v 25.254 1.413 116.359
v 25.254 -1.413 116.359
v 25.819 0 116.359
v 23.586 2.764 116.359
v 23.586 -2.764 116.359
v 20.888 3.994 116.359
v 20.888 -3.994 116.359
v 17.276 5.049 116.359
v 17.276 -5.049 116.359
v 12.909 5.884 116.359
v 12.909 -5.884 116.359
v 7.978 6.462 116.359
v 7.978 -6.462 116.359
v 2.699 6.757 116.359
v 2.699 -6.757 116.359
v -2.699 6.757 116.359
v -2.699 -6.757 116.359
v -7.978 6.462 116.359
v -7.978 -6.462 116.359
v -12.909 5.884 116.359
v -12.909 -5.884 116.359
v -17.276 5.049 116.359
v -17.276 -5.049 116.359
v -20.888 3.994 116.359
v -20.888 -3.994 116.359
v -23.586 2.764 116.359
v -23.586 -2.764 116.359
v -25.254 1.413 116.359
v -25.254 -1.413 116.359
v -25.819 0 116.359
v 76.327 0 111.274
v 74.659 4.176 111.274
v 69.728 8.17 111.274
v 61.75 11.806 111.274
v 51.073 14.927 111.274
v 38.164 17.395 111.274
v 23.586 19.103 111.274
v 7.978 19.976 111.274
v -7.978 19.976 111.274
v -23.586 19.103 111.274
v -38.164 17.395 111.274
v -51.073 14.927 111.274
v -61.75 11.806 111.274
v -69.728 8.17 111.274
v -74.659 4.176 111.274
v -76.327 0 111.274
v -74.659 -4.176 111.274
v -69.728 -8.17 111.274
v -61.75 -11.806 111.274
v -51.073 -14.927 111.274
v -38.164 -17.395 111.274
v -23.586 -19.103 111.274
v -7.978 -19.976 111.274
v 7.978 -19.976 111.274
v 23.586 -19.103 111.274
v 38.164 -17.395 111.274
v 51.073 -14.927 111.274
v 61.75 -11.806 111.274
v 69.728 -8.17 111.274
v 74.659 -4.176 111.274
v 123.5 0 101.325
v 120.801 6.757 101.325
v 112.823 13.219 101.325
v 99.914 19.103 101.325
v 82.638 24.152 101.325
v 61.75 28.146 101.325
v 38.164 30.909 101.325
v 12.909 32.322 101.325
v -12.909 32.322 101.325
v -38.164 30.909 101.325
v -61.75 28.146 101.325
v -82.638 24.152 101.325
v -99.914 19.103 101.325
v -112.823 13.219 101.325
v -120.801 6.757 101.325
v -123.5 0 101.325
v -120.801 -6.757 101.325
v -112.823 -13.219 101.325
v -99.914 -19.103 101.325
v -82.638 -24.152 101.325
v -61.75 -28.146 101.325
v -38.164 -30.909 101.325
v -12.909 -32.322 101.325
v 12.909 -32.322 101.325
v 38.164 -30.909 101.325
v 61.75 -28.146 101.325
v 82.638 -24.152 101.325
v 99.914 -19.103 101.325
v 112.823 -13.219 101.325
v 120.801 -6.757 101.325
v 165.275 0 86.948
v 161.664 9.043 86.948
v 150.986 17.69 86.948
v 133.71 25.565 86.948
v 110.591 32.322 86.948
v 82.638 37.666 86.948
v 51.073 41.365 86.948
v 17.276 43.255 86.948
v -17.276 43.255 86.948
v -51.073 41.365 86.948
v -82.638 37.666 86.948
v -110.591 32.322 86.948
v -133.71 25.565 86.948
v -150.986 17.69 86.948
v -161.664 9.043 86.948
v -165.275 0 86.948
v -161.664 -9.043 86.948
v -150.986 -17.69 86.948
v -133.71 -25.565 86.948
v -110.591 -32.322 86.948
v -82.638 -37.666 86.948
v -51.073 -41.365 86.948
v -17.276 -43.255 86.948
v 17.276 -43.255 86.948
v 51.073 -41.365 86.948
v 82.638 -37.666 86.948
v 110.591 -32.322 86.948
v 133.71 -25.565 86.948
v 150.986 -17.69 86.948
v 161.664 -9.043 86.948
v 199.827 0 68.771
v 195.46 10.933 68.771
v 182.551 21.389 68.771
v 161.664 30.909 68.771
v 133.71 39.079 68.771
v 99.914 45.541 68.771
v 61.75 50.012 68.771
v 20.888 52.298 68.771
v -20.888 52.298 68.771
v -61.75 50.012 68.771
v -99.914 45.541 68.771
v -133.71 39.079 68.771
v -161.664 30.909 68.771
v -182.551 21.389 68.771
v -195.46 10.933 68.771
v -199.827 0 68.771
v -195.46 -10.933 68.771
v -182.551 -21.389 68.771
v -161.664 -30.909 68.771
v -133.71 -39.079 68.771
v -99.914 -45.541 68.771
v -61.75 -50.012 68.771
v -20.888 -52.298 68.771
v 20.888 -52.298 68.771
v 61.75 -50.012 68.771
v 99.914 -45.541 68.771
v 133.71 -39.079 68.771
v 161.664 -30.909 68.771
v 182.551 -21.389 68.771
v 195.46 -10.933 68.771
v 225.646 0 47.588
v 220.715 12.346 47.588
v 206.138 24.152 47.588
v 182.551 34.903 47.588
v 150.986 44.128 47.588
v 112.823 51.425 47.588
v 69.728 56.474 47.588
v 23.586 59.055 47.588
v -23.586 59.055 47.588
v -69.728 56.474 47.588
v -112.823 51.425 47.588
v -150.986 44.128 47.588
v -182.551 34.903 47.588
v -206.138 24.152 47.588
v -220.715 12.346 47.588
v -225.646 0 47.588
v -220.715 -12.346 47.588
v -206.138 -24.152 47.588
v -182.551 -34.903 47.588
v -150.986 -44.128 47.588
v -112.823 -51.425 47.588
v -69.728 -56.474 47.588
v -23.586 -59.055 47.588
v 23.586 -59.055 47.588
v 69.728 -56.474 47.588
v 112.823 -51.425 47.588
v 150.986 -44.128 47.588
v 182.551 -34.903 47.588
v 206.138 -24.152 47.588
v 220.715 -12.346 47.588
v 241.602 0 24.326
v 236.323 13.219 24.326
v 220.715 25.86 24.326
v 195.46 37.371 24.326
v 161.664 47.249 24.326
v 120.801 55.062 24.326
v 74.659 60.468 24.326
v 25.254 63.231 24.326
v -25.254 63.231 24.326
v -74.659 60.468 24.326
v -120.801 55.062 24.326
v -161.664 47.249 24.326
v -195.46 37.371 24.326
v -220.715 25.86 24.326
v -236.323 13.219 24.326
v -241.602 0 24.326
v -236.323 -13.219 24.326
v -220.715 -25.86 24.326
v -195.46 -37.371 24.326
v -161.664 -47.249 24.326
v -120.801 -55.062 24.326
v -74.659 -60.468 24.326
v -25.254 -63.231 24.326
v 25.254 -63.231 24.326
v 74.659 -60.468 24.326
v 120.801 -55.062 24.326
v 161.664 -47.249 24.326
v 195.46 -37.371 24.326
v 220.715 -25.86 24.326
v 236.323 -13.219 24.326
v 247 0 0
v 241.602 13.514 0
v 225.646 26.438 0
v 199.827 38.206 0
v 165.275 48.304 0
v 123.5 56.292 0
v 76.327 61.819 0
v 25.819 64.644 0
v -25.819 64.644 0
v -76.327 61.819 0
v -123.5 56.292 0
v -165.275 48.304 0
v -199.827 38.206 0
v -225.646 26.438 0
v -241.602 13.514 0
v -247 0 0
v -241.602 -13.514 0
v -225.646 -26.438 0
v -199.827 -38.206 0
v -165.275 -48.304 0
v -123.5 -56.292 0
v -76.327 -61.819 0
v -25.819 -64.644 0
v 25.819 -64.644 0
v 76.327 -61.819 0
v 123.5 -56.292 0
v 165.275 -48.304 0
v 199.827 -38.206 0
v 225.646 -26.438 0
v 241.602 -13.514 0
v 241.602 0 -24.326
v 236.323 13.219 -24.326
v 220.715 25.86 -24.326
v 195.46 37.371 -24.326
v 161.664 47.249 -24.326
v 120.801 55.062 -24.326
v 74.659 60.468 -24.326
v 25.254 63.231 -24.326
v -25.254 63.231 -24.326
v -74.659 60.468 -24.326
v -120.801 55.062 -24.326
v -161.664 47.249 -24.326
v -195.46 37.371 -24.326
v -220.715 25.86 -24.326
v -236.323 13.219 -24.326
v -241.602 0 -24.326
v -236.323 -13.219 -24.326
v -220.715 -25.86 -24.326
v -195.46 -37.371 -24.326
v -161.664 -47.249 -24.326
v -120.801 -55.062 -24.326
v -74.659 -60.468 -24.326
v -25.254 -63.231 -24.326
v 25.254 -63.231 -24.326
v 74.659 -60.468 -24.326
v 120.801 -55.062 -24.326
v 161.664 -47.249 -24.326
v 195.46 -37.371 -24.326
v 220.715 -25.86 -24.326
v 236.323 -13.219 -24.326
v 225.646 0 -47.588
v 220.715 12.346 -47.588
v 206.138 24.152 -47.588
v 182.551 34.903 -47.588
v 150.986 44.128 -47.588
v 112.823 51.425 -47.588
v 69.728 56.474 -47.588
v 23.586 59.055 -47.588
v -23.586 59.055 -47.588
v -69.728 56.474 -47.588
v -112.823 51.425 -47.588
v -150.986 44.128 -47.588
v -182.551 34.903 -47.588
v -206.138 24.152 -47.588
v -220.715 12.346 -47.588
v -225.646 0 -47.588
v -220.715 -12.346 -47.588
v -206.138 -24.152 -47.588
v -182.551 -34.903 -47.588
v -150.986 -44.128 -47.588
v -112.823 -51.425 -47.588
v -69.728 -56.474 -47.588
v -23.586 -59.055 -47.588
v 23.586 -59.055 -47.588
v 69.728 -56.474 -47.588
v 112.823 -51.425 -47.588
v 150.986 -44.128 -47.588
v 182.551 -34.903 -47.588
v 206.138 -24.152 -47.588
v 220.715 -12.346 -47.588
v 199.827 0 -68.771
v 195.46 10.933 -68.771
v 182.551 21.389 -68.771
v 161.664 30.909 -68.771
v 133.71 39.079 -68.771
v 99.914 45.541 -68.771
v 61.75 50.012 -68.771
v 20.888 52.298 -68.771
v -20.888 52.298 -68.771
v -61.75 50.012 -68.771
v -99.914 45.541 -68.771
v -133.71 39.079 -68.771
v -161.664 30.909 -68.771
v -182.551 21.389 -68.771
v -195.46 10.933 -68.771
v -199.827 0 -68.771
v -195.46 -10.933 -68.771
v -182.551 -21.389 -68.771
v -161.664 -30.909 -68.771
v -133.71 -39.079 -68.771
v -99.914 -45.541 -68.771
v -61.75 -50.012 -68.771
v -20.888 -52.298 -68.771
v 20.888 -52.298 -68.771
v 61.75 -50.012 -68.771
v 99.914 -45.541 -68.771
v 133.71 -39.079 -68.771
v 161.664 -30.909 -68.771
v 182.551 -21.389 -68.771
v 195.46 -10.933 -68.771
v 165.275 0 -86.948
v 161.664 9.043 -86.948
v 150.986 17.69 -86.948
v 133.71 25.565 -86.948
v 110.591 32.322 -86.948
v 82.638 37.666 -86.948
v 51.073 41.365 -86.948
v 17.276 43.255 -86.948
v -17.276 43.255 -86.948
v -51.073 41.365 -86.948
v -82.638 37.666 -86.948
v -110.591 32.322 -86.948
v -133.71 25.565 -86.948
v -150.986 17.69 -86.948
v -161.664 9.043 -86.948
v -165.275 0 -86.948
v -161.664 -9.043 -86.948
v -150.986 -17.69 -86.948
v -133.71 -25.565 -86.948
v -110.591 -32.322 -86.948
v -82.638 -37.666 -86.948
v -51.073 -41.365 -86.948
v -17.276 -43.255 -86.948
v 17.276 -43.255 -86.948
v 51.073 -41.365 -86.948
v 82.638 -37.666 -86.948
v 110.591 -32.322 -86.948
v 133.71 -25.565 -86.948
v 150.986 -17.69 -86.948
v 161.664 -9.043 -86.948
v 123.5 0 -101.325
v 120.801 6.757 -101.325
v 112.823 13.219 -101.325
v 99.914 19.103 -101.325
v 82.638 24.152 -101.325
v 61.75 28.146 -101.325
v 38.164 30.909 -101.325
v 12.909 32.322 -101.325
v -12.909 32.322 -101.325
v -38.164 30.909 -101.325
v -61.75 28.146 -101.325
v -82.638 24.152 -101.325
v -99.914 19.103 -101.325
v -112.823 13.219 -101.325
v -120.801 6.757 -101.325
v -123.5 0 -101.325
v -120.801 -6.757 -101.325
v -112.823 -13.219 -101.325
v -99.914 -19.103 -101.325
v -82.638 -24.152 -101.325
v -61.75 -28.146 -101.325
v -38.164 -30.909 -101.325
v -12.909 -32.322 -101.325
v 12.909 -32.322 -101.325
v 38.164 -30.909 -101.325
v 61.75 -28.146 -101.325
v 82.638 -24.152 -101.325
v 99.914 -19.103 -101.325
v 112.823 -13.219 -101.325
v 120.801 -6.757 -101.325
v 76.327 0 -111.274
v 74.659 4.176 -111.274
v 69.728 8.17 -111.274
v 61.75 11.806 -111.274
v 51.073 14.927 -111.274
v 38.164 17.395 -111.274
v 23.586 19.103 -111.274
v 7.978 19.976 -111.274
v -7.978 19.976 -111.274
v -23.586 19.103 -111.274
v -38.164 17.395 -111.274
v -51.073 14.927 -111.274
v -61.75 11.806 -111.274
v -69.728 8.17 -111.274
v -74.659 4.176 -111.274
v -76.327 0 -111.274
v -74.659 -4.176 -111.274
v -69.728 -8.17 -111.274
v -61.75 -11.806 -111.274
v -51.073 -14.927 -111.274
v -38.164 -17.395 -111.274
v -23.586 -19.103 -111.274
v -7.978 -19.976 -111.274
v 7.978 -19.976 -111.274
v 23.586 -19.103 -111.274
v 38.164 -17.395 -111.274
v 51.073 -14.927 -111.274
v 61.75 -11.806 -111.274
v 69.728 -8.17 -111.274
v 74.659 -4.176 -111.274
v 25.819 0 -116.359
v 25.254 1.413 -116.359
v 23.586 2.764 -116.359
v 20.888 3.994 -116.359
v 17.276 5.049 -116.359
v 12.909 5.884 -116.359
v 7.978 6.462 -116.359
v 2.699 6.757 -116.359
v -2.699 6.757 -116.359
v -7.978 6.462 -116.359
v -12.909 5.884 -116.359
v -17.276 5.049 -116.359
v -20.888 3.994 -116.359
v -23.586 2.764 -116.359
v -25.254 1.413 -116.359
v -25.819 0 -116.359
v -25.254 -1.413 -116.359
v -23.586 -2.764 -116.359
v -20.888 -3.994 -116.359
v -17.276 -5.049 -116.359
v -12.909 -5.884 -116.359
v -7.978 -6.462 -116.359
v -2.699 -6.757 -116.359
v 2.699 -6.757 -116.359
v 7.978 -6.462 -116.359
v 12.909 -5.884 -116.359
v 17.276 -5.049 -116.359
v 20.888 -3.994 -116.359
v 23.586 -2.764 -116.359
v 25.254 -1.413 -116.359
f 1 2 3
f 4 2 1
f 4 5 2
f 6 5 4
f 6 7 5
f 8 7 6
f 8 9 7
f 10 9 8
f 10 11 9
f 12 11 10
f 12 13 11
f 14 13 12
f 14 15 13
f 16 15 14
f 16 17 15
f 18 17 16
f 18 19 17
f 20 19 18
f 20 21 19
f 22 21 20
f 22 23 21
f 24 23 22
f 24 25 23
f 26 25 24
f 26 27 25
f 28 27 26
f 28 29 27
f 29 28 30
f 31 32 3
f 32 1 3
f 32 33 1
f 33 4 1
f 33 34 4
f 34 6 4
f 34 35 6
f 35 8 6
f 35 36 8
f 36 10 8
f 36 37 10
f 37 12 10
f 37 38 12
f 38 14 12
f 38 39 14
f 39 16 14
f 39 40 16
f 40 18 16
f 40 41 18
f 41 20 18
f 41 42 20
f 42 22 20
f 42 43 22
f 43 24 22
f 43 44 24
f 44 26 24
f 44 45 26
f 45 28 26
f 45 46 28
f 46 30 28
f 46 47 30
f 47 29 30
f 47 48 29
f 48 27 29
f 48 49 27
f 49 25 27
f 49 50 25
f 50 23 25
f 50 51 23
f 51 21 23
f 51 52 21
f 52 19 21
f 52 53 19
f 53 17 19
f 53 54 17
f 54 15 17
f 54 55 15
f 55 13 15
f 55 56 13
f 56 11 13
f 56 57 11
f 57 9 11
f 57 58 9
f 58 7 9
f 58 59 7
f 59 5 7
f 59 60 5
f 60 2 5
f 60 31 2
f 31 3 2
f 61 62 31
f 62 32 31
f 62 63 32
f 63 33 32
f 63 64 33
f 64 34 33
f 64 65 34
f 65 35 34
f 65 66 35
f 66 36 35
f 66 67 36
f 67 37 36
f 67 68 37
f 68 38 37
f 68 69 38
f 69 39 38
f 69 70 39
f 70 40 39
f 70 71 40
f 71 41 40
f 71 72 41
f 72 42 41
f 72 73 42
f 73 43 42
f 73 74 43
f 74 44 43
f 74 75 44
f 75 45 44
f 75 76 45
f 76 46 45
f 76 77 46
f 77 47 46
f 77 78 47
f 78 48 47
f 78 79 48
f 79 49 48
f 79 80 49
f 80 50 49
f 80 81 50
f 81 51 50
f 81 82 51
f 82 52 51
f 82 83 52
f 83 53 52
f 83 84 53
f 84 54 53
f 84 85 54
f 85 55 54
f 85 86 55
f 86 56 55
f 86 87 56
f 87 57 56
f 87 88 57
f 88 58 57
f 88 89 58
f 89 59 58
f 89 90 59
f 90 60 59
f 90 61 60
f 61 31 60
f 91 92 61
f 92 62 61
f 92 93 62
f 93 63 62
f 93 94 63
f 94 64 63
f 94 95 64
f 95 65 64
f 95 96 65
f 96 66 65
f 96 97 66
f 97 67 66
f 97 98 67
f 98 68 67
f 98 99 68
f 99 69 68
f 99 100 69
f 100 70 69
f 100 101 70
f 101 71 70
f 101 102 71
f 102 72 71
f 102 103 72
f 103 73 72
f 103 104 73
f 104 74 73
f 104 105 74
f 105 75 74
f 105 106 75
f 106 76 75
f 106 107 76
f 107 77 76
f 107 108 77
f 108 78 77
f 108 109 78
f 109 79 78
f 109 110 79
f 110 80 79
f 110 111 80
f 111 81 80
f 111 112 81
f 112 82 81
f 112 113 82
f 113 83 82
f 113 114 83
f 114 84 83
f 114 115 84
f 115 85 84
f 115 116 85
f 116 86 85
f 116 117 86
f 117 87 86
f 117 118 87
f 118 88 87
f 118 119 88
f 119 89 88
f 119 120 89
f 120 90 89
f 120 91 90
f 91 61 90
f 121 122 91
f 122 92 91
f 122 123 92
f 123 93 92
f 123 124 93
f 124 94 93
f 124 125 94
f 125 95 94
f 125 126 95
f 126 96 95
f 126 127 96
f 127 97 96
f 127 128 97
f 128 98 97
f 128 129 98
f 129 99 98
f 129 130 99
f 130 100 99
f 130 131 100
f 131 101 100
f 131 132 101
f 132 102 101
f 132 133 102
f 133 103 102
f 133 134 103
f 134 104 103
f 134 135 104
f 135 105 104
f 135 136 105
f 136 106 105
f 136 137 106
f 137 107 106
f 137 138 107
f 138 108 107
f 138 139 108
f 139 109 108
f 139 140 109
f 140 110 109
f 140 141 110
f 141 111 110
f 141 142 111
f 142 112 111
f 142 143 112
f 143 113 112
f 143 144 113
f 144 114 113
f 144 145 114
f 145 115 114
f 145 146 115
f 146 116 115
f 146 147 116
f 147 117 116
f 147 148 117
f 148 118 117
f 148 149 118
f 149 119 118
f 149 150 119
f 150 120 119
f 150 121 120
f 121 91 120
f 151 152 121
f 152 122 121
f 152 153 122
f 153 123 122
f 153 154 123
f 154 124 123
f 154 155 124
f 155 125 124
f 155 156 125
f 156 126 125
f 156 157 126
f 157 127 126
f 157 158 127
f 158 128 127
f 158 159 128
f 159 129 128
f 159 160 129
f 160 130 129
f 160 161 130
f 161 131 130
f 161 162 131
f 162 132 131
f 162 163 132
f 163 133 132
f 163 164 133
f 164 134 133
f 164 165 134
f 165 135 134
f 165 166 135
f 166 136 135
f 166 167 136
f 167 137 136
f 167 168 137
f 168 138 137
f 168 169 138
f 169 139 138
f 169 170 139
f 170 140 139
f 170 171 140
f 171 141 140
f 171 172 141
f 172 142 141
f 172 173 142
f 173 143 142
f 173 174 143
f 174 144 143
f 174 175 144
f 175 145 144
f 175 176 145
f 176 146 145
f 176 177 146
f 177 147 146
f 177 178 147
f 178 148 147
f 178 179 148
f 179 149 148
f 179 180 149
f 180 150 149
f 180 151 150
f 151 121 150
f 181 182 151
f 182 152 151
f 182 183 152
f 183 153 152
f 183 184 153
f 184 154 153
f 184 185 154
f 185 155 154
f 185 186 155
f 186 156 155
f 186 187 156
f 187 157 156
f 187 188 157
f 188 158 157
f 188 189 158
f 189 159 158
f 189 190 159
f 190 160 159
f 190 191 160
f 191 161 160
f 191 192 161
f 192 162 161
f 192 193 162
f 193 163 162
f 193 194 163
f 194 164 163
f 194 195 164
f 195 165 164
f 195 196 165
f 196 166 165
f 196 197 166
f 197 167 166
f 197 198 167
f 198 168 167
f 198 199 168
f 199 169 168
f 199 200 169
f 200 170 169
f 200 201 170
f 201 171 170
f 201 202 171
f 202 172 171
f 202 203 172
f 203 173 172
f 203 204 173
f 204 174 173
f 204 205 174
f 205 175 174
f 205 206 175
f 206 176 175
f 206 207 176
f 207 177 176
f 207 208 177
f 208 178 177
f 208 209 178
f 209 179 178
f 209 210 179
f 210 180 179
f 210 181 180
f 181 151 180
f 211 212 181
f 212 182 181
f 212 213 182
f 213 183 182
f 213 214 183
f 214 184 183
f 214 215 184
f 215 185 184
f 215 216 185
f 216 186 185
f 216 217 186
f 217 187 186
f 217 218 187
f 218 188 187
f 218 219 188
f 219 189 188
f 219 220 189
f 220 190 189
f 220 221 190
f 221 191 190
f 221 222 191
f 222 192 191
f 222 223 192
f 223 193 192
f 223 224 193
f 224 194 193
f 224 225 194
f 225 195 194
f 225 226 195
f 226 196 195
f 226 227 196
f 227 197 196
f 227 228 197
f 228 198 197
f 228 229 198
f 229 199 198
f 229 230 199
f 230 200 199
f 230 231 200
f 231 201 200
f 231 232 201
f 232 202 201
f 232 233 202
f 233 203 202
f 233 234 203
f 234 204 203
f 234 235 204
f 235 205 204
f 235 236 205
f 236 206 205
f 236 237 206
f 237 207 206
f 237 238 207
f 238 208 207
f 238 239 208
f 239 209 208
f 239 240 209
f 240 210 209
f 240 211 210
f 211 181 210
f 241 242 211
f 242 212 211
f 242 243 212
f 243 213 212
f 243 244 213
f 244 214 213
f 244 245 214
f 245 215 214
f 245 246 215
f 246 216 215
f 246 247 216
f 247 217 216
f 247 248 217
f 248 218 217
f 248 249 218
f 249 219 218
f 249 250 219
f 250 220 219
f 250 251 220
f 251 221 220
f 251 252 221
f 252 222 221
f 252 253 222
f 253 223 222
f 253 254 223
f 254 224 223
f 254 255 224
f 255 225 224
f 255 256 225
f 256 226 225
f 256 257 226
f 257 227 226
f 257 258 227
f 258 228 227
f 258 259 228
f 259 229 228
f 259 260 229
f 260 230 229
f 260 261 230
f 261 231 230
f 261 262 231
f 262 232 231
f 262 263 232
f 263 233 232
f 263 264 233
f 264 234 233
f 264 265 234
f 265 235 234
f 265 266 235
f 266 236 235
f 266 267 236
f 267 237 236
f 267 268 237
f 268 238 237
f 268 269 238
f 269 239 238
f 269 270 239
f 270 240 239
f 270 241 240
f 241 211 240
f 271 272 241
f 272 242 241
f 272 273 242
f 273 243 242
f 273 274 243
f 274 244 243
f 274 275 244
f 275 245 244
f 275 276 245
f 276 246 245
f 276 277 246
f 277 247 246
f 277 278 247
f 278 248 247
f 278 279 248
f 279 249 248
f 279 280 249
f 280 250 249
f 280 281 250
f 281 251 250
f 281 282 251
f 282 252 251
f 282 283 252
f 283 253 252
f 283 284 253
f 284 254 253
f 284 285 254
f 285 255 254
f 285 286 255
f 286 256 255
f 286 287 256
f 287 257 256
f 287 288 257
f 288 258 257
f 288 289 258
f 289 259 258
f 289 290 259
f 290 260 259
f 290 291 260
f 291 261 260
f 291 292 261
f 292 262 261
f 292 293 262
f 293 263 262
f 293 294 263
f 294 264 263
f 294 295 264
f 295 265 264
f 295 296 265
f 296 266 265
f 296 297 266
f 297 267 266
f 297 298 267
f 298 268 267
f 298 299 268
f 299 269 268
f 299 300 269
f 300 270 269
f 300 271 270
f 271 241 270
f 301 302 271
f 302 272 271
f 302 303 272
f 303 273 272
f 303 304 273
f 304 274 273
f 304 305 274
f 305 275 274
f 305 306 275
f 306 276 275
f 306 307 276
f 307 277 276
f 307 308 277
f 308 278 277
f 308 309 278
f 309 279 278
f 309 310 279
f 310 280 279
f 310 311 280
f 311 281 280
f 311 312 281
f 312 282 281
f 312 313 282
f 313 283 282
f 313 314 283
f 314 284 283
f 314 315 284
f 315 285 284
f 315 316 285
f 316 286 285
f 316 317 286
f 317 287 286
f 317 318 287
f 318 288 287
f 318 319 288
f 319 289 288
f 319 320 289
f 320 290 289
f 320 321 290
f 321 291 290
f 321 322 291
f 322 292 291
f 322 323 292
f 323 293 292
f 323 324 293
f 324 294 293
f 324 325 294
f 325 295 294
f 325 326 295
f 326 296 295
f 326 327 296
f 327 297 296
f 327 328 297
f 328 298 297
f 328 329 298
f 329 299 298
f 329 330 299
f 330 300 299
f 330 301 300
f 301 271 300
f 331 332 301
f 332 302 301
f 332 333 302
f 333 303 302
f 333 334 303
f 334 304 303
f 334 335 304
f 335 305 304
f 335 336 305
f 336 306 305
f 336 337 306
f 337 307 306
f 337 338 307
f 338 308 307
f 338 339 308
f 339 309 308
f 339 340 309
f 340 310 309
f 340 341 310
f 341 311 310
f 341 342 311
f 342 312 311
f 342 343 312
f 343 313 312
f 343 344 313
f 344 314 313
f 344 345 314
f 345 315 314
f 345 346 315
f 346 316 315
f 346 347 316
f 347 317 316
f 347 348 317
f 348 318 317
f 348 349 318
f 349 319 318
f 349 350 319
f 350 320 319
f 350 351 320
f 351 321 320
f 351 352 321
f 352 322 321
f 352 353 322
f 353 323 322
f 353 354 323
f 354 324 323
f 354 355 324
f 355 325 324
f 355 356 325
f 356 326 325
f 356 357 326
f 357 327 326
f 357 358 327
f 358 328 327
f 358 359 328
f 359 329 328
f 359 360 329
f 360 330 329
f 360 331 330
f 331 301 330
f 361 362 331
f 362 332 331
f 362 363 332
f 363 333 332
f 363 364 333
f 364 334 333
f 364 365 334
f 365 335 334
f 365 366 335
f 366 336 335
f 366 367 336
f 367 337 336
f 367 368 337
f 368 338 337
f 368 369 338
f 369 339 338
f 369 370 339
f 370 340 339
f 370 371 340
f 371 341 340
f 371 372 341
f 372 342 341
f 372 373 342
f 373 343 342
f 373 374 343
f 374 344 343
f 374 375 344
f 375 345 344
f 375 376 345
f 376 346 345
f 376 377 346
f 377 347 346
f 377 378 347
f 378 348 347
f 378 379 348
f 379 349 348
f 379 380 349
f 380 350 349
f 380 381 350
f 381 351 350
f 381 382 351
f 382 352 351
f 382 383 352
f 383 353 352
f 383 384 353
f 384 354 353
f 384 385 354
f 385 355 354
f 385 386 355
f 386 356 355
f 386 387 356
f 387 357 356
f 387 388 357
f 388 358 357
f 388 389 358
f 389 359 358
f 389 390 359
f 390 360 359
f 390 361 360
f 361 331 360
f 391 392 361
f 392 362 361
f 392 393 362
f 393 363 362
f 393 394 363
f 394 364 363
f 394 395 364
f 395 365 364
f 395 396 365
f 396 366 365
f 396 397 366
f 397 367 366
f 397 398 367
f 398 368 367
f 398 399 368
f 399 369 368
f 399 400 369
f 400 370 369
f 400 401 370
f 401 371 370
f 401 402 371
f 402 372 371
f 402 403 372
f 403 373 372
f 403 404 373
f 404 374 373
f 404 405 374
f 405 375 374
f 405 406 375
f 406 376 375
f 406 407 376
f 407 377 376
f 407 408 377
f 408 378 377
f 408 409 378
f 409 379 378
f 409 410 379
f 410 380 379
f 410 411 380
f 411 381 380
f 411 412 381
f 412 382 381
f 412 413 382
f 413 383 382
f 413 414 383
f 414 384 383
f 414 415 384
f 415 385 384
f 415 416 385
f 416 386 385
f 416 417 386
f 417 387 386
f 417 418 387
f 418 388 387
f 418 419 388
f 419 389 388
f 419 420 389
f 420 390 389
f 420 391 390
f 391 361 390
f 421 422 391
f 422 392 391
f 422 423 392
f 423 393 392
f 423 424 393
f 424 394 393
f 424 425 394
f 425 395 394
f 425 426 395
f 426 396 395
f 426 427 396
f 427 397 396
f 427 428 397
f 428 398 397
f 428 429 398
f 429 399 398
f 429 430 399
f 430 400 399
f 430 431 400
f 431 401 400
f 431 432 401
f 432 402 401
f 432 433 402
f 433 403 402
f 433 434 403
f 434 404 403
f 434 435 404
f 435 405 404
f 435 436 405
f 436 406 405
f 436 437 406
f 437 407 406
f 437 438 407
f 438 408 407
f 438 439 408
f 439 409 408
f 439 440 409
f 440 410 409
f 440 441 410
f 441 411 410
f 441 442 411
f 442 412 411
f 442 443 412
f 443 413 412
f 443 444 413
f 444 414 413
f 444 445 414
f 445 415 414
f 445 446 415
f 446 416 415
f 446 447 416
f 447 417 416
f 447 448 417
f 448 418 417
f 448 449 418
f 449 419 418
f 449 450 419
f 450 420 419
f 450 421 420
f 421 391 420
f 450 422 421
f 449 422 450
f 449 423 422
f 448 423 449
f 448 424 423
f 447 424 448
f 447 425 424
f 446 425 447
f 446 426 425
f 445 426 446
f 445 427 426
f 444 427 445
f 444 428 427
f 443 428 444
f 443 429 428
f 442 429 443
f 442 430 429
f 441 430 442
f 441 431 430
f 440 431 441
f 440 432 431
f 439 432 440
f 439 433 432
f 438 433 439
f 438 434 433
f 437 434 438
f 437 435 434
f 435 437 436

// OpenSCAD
// Generated by SolidPython 1.0.1 on 2020-07-29 00:46:53


scale(v = [19, 5, 9]) {
	sphere(r = 13);
}
/***********************************************
*********      SolidPython code:      **********
************************************************
 
# import packages: SolidPython
from solid import *
from solid.utils import *
from itertools import chain, combinations, permutations


class Resize:

    def __init__(self, scad_file):
        self.scad_file = scad_file
        #self.scad_file = import_scad(scad_file)
        # cone/cylinder param:
        self.r1 = 0
        self.r2 = 0
        self.h = 0
        # rectangular prism param:
        self.w = 0
        self.l = 0
        # ellipse param:
        self.r = 0

    # import OpenScad code (file name corresponds to shape)


    # classify shape + parameters
    def assign(self, param1, param2, param3):
        if self.scad_file == 'cone.scad':
            self.r1 = param1
            self.r2 = param2
            self.h = param3
        elif self.scad_file == 'cylinder.scad':
            self.r1 = param1
            self.r2 = param2
            self.h = param3
        elif self.scad_file == 'rectangularPrism.scad':
            self.h = param1
            self.l = param2
            self.w = param3
        else:
            self.r = param1
            self.h = param2

    # resize parameters
    def iterate(self):
        x = range(3, 20, 2)
        i = 1
        if self.scad_file == 'cone.scad':
            tempList = list(permutations(x, 2))
            for temp in tempList:
                param1 = temp[0]
                param2 = temp[1]
                filepath = 'produced_scad_files/' + 'cone' + str(param1) + '_' + str(param2) + '_' + '.scad'
                scad_render_to_file(cylinder(h=param1, r1=param2, r2=0), filepath)

        elif self.scad_file == 'cylinder.scad':
            tempList = list(permutations(x, 3))
            for temp in tempList:
                param1 = temp[0]
                param2 = temp[1]
                filepath = 'produced_scad_files/' + 'cylinder' + str(param1) + '_' + str(param2) + '_' + '.scad'
                scad_render_to_file(cylinder(h=param1, r1=param2, r2=param2), filepath)

        elif self.scad_file == 'rectangularPrism.scad':
            tempList = list(permutations(x, 3))
            for temp in tempList:
                param1 = temp[0]
                param2 = temp[1]
                param3 = temp[2]
                filepath = 'produced_scad_files/' + 'rectangularPrism' + str(param1) + '_' + str(param2) + '_' + str(
                    param3) + '.scad'
                scad_render_to_file(cube(size=(param1, param2, param3)), filepath)

        elif self.scad_file == 'ellipse.scad':
            tempList = list(permutations(x, 4))
            for temp in tempList:
                param1 = temp[0]
                param2 = temp[1]
                param3 = temp[2]
                param4 = temp[3]
                filepath = 'produced_scad_files/' + 'ellipse' + str(param1) + '_' + str(param2) + '_' + str(param3) + '_' + str(param4) + '.scad'
                scad_render_to_file(scale([param1, param2, param3])(sphere(r=param4)), filepath)

    def render_to_scadfile(self):
        scad_render_to_file(scad, 'example.scad') 
 
************************************************/
